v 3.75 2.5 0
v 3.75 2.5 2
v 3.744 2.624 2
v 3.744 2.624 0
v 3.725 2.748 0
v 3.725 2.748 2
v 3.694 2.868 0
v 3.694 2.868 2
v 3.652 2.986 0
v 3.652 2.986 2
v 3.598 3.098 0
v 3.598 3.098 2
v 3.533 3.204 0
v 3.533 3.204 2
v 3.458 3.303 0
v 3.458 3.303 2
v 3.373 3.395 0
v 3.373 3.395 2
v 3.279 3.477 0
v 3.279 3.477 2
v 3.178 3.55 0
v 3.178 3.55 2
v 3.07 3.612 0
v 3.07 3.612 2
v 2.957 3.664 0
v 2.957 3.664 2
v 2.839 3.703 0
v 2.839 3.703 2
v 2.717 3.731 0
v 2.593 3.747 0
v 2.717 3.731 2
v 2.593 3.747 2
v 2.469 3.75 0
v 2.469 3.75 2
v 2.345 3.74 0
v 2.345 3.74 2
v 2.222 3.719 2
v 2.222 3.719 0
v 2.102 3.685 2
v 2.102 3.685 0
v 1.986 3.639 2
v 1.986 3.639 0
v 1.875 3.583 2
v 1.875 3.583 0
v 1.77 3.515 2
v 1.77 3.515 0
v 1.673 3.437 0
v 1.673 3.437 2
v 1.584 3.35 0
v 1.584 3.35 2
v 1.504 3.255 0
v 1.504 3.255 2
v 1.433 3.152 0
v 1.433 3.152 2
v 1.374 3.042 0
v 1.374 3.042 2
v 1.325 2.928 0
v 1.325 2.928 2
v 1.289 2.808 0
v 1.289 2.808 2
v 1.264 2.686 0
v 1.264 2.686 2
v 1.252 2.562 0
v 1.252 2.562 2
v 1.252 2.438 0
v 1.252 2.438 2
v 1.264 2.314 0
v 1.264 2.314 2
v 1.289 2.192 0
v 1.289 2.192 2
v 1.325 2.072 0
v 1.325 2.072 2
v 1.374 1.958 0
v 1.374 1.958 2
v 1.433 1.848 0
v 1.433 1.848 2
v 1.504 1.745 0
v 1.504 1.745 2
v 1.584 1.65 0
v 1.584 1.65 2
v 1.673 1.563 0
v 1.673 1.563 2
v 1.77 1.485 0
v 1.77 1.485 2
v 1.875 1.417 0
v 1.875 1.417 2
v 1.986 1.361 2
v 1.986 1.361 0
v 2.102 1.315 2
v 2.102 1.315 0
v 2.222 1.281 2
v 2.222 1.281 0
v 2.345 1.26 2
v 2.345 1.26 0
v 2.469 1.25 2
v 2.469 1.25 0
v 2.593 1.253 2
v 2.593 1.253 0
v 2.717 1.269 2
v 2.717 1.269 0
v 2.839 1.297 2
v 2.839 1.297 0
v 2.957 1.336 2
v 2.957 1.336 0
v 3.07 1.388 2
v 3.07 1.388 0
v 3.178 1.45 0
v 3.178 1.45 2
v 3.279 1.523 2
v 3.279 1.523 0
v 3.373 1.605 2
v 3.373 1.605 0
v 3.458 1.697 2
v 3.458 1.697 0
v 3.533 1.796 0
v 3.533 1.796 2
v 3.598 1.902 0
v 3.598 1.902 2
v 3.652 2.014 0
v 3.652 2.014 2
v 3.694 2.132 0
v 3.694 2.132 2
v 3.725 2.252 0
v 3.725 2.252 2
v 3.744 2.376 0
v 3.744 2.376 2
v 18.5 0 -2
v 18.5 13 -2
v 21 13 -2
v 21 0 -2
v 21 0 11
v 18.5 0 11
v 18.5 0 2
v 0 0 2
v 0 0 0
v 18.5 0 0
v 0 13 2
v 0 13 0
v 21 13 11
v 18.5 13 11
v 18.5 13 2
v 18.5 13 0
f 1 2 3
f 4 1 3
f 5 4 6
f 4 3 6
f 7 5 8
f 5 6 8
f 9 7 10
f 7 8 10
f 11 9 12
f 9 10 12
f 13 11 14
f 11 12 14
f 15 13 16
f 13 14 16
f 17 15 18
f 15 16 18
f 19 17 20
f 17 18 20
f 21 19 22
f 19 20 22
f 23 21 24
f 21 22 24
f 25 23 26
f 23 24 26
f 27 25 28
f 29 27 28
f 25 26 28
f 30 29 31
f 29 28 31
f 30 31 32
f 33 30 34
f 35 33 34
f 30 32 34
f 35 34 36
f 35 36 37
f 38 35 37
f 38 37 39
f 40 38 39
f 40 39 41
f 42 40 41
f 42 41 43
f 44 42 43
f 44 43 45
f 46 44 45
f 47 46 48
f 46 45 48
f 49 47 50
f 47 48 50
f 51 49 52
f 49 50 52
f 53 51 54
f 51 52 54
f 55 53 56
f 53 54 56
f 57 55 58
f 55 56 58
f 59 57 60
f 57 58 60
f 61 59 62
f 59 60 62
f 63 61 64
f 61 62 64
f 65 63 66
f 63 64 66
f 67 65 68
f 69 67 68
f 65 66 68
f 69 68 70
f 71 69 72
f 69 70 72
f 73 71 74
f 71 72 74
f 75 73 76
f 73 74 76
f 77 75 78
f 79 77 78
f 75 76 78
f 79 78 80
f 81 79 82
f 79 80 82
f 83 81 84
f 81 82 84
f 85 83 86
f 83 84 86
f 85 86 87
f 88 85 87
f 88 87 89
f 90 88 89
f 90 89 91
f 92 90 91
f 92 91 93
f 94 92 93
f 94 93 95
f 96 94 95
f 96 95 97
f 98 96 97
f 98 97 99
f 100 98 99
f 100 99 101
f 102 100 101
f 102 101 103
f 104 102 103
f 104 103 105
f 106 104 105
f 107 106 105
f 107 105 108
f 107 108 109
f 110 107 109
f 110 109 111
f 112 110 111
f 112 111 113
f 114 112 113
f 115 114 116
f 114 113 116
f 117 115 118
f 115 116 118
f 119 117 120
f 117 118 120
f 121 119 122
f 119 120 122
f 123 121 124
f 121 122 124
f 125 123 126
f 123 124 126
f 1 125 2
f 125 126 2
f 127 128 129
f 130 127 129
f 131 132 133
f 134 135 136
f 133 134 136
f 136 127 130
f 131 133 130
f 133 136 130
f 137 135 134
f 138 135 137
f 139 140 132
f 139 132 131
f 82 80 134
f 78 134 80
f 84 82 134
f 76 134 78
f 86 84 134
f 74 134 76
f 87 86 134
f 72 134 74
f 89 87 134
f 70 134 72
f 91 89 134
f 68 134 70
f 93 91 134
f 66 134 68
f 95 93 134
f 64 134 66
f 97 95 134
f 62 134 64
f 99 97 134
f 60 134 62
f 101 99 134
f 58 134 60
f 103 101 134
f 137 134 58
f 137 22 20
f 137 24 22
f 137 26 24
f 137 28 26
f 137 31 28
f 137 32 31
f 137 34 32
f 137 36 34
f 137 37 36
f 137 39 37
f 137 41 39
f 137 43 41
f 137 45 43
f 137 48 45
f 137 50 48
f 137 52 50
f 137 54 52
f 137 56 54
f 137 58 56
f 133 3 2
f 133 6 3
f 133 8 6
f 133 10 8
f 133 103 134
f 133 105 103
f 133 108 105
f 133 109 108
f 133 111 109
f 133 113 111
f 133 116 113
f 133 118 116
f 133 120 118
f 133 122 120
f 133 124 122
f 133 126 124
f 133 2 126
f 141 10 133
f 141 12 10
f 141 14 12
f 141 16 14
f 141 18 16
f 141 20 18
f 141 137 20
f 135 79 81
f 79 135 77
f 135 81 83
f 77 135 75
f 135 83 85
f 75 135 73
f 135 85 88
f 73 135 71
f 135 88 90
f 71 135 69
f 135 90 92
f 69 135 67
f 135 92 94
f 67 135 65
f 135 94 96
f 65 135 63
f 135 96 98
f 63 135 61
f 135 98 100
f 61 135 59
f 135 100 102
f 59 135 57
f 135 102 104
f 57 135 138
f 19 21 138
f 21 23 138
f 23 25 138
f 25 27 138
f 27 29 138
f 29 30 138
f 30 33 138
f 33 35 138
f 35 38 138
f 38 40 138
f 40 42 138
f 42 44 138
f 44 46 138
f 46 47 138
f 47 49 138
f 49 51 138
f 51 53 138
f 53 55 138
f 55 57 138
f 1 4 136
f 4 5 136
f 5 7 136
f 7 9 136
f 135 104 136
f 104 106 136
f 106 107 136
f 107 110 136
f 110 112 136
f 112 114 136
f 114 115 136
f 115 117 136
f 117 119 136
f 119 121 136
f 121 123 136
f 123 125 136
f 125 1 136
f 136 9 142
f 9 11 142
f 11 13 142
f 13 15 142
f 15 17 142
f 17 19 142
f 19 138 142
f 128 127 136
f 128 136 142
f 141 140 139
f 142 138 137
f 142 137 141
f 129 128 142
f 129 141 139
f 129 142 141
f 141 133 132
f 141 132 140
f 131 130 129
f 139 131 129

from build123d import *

# Parameters (mm, degrees)
ESQUISSE1_W             = 21
ESQUISSE1_H             = 13
BOSS_EXTRU_1_DEPTH      = 2
ESQUISSE2_R             = 1.25
ENL_V_MAT_EXTRU_1_DEPTH = 2
BOSS_EXTRU_2_DEPTH      = 9
BOSS_EXTRU_2_DEPTH_BACK = 4
ESQUISSE3_W             = 2.5
ESQUISSE3_H             = 13


with BuildPart() as part:
    # Esquisse1 → Boss.-Extru.1 (new body)
    with BuildSketch(Plane.XY):
        with Locations((10.5, 6.5)):
            Rectangle(ESQUISSE1_W, ESQUISSE1_H)
    extrude(amount=BOSS_EXTRU_1_DEPTH)

    # Esquisse2 → Enlèv. mat.-Extru.1 (cut)
    with BuildSketch(Plane.XY.offset(2)):
        with Locations((2.5, 2.5)):
            Circle(ESQUISSE2_R)
    extrude(amount=-ENL_V_MAT_EXTRU_1_DEPTH, mode=Mode.SUBTRACT)

    # Esquisse3 → Boss.-Extru.2 (add, two sides: drawn at the far end of the back side and taken through both)
    with BuildSketch(Plane.XY.offset(2).offset(-BOSS_EXTRU_2_DEPTH_BACK)):
        with Locations((19.75, 6.5)):
            Rectangle(ESQUISSE3_W, ESQUISSE3_H)
    extrude(amount=BOSS_EXTRU_2_DEPTH + BOSS_EXTRU_2_DEPTH_BACK)


solid = part.part
